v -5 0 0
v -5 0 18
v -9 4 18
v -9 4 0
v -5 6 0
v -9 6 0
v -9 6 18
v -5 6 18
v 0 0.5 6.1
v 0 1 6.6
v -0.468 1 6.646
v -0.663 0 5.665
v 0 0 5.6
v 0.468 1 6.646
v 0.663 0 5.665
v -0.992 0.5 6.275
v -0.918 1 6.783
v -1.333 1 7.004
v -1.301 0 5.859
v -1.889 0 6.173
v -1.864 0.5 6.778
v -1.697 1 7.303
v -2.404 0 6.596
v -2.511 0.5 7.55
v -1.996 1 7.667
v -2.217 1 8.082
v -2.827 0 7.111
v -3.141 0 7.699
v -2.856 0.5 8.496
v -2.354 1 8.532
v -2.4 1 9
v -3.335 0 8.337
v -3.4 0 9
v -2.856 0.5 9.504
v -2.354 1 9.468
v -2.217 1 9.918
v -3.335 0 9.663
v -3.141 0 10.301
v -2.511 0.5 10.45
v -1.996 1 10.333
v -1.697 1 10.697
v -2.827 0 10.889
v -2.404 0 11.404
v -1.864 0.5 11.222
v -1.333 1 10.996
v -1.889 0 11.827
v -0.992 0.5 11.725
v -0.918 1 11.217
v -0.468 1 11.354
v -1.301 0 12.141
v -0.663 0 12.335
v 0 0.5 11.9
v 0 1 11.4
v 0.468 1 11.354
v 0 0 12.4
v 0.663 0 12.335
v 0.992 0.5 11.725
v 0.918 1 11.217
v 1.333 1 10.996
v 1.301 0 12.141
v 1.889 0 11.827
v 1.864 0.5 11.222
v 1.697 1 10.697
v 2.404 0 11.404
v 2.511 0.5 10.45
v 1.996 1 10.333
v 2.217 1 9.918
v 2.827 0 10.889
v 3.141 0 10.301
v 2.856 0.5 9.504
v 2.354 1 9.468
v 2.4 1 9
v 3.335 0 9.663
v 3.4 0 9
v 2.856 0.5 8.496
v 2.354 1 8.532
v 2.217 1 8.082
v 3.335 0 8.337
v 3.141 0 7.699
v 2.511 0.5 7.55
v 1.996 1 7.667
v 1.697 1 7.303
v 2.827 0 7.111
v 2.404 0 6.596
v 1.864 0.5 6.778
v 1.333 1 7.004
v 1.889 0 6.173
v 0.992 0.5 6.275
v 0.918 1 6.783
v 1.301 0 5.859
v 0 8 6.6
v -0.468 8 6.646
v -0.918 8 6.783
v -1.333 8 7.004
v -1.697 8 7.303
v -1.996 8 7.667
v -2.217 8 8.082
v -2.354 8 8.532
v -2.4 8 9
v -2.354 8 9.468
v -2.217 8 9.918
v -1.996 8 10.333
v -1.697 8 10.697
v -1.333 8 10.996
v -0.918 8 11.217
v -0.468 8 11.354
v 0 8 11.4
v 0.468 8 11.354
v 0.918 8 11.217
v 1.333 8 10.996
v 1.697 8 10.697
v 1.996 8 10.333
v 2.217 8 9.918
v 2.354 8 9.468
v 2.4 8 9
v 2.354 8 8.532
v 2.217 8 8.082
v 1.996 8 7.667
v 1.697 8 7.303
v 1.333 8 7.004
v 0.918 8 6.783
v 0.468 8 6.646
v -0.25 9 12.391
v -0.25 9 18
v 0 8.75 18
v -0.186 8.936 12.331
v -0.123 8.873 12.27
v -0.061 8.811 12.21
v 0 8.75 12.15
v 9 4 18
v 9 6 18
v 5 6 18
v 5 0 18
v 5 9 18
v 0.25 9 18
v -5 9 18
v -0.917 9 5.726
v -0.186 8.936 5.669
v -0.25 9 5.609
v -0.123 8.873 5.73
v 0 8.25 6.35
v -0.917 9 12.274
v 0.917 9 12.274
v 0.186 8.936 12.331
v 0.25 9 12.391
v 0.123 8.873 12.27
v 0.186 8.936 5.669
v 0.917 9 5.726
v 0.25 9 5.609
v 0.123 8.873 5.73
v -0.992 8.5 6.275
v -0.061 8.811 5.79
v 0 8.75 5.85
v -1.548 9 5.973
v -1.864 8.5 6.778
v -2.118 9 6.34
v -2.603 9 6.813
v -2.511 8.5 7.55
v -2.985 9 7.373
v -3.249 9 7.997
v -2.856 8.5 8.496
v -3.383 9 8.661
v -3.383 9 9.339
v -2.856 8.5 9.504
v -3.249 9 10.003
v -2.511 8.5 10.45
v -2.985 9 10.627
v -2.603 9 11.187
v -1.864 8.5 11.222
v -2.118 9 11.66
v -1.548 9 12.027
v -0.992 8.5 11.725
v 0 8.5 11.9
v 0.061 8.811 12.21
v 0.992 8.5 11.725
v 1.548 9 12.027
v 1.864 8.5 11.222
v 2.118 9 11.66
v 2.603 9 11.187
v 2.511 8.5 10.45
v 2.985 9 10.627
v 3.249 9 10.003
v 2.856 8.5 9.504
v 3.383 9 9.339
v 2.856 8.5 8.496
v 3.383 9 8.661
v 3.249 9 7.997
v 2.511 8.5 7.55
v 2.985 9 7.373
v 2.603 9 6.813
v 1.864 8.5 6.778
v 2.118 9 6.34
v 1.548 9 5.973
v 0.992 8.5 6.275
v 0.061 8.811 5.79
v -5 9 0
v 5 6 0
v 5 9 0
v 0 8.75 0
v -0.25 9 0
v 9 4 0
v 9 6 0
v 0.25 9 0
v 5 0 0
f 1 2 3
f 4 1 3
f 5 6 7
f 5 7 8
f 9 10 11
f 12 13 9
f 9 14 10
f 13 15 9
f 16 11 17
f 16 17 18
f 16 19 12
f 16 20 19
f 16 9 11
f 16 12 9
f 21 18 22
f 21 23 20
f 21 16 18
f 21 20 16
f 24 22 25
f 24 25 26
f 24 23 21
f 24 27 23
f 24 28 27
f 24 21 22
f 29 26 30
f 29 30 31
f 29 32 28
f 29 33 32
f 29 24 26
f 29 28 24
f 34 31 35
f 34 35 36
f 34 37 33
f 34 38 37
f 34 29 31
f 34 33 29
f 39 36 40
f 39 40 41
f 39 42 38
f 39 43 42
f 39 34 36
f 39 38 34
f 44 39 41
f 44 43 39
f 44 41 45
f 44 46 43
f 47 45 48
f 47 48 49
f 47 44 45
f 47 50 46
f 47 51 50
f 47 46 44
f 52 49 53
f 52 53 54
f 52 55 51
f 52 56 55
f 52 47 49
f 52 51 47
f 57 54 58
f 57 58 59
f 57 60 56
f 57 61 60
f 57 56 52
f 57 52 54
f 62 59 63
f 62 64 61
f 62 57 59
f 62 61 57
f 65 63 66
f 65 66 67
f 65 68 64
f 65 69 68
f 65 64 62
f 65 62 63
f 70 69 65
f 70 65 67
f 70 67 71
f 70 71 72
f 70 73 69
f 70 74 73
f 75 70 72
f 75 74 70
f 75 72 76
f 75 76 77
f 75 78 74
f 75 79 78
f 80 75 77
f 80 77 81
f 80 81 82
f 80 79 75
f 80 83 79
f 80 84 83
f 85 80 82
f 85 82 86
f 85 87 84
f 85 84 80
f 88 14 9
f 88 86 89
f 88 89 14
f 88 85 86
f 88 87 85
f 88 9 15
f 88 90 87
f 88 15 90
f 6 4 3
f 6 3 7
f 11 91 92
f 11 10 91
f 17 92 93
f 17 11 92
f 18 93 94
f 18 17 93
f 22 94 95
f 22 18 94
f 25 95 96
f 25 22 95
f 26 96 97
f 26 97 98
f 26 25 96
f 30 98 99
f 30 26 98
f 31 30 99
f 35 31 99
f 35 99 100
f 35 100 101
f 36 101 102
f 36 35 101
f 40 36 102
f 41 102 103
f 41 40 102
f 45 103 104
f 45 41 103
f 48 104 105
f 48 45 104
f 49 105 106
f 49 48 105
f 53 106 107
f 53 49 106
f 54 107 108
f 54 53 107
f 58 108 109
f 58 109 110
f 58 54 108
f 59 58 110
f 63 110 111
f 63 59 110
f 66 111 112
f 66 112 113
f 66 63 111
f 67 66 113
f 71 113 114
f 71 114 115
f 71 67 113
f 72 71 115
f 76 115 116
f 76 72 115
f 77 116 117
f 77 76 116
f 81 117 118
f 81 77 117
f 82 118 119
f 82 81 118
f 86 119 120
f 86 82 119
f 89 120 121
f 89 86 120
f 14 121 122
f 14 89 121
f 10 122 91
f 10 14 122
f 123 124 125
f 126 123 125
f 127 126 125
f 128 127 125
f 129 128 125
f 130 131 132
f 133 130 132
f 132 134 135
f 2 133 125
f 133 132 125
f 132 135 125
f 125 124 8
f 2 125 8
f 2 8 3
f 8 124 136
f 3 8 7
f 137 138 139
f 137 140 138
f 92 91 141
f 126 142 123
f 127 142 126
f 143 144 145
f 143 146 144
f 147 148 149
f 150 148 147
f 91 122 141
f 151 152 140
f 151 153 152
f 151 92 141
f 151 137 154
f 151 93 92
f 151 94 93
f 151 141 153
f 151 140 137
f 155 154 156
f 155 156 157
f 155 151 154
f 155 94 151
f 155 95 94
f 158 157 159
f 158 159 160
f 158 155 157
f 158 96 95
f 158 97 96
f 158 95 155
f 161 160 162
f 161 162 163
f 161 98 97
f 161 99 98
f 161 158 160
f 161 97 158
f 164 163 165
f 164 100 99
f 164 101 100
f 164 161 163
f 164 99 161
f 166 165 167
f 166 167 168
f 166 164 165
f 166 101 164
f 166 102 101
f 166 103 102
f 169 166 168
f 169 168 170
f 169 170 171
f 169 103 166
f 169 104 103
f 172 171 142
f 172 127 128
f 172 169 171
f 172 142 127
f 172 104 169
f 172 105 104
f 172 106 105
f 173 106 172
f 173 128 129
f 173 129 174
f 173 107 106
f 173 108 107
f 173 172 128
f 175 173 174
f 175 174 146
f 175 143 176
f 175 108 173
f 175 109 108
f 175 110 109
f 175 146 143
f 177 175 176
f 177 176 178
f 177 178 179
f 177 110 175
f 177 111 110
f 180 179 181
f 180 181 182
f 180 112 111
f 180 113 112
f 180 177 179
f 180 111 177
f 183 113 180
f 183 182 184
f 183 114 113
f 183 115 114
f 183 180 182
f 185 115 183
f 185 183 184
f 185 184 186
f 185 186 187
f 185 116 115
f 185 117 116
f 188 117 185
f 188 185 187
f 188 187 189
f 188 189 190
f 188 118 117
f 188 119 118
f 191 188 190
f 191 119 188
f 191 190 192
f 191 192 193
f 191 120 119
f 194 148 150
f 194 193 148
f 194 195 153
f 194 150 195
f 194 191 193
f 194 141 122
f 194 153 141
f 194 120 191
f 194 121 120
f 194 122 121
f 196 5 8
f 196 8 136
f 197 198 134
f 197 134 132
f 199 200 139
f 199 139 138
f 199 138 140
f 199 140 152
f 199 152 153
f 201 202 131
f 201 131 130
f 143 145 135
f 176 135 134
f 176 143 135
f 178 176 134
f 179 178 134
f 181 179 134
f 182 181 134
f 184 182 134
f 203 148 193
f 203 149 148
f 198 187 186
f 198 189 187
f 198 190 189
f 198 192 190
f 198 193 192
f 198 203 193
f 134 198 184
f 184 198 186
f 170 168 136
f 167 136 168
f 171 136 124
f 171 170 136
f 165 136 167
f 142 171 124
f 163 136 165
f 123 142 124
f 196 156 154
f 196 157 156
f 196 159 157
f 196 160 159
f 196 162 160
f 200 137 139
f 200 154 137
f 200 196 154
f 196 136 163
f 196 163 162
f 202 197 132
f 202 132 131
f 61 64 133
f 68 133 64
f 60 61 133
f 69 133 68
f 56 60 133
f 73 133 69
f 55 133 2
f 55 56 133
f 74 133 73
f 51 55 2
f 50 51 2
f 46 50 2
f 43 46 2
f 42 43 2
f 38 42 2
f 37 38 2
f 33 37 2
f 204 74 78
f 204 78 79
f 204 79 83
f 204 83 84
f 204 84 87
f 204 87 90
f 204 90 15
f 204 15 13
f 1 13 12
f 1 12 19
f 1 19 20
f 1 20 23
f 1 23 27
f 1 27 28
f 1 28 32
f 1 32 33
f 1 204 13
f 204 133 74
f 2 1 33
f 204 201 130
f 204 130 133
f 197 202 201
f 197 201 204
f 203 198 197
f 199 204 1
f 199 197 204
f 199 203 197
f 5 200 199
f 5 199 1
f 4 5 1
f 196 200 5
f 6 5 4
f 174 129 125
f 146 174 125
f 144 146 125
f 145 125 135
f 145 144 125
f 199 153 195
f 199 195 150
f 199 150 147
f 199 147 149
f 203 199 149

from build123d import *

# Parameters (mm, degrees)
EXTRUDED_1_DEPTH = 18


with BuildPart() as part:
    # Эскиз1 → Extruded 1 (new body)
    with BuildSketch(Plane.XY):
        Polygon((-5, 0), (-9, 4), (-9, 6), (-5, 6), (-5, 9), (-0.25, 9), (0, 8.75), (0.25, 9), (5, 9), (5, 6), (9, 6), (9, 4), (5, 0), align=None)
    extrude(amount=EXTRUDED_1_DEPTH)

    # Эскиз2 → Revolved Cut 1 (revolve, cut)
    with BuildSketch(Plane(origin=(0, 0, 0), x_dir=(0, 0, -1), z_dir=(1, 0, 0))):
        Polygon((-9, 0), (-9, 9), (-5.6, 9), (-6.6, 8), (-6.6, 1), (-5.6, 0), align=None)
    revolve(axis=Axis((0, 0, 9), (0, 1, 0)), mode=Mode.SUBTRACT)


solid = part.part
